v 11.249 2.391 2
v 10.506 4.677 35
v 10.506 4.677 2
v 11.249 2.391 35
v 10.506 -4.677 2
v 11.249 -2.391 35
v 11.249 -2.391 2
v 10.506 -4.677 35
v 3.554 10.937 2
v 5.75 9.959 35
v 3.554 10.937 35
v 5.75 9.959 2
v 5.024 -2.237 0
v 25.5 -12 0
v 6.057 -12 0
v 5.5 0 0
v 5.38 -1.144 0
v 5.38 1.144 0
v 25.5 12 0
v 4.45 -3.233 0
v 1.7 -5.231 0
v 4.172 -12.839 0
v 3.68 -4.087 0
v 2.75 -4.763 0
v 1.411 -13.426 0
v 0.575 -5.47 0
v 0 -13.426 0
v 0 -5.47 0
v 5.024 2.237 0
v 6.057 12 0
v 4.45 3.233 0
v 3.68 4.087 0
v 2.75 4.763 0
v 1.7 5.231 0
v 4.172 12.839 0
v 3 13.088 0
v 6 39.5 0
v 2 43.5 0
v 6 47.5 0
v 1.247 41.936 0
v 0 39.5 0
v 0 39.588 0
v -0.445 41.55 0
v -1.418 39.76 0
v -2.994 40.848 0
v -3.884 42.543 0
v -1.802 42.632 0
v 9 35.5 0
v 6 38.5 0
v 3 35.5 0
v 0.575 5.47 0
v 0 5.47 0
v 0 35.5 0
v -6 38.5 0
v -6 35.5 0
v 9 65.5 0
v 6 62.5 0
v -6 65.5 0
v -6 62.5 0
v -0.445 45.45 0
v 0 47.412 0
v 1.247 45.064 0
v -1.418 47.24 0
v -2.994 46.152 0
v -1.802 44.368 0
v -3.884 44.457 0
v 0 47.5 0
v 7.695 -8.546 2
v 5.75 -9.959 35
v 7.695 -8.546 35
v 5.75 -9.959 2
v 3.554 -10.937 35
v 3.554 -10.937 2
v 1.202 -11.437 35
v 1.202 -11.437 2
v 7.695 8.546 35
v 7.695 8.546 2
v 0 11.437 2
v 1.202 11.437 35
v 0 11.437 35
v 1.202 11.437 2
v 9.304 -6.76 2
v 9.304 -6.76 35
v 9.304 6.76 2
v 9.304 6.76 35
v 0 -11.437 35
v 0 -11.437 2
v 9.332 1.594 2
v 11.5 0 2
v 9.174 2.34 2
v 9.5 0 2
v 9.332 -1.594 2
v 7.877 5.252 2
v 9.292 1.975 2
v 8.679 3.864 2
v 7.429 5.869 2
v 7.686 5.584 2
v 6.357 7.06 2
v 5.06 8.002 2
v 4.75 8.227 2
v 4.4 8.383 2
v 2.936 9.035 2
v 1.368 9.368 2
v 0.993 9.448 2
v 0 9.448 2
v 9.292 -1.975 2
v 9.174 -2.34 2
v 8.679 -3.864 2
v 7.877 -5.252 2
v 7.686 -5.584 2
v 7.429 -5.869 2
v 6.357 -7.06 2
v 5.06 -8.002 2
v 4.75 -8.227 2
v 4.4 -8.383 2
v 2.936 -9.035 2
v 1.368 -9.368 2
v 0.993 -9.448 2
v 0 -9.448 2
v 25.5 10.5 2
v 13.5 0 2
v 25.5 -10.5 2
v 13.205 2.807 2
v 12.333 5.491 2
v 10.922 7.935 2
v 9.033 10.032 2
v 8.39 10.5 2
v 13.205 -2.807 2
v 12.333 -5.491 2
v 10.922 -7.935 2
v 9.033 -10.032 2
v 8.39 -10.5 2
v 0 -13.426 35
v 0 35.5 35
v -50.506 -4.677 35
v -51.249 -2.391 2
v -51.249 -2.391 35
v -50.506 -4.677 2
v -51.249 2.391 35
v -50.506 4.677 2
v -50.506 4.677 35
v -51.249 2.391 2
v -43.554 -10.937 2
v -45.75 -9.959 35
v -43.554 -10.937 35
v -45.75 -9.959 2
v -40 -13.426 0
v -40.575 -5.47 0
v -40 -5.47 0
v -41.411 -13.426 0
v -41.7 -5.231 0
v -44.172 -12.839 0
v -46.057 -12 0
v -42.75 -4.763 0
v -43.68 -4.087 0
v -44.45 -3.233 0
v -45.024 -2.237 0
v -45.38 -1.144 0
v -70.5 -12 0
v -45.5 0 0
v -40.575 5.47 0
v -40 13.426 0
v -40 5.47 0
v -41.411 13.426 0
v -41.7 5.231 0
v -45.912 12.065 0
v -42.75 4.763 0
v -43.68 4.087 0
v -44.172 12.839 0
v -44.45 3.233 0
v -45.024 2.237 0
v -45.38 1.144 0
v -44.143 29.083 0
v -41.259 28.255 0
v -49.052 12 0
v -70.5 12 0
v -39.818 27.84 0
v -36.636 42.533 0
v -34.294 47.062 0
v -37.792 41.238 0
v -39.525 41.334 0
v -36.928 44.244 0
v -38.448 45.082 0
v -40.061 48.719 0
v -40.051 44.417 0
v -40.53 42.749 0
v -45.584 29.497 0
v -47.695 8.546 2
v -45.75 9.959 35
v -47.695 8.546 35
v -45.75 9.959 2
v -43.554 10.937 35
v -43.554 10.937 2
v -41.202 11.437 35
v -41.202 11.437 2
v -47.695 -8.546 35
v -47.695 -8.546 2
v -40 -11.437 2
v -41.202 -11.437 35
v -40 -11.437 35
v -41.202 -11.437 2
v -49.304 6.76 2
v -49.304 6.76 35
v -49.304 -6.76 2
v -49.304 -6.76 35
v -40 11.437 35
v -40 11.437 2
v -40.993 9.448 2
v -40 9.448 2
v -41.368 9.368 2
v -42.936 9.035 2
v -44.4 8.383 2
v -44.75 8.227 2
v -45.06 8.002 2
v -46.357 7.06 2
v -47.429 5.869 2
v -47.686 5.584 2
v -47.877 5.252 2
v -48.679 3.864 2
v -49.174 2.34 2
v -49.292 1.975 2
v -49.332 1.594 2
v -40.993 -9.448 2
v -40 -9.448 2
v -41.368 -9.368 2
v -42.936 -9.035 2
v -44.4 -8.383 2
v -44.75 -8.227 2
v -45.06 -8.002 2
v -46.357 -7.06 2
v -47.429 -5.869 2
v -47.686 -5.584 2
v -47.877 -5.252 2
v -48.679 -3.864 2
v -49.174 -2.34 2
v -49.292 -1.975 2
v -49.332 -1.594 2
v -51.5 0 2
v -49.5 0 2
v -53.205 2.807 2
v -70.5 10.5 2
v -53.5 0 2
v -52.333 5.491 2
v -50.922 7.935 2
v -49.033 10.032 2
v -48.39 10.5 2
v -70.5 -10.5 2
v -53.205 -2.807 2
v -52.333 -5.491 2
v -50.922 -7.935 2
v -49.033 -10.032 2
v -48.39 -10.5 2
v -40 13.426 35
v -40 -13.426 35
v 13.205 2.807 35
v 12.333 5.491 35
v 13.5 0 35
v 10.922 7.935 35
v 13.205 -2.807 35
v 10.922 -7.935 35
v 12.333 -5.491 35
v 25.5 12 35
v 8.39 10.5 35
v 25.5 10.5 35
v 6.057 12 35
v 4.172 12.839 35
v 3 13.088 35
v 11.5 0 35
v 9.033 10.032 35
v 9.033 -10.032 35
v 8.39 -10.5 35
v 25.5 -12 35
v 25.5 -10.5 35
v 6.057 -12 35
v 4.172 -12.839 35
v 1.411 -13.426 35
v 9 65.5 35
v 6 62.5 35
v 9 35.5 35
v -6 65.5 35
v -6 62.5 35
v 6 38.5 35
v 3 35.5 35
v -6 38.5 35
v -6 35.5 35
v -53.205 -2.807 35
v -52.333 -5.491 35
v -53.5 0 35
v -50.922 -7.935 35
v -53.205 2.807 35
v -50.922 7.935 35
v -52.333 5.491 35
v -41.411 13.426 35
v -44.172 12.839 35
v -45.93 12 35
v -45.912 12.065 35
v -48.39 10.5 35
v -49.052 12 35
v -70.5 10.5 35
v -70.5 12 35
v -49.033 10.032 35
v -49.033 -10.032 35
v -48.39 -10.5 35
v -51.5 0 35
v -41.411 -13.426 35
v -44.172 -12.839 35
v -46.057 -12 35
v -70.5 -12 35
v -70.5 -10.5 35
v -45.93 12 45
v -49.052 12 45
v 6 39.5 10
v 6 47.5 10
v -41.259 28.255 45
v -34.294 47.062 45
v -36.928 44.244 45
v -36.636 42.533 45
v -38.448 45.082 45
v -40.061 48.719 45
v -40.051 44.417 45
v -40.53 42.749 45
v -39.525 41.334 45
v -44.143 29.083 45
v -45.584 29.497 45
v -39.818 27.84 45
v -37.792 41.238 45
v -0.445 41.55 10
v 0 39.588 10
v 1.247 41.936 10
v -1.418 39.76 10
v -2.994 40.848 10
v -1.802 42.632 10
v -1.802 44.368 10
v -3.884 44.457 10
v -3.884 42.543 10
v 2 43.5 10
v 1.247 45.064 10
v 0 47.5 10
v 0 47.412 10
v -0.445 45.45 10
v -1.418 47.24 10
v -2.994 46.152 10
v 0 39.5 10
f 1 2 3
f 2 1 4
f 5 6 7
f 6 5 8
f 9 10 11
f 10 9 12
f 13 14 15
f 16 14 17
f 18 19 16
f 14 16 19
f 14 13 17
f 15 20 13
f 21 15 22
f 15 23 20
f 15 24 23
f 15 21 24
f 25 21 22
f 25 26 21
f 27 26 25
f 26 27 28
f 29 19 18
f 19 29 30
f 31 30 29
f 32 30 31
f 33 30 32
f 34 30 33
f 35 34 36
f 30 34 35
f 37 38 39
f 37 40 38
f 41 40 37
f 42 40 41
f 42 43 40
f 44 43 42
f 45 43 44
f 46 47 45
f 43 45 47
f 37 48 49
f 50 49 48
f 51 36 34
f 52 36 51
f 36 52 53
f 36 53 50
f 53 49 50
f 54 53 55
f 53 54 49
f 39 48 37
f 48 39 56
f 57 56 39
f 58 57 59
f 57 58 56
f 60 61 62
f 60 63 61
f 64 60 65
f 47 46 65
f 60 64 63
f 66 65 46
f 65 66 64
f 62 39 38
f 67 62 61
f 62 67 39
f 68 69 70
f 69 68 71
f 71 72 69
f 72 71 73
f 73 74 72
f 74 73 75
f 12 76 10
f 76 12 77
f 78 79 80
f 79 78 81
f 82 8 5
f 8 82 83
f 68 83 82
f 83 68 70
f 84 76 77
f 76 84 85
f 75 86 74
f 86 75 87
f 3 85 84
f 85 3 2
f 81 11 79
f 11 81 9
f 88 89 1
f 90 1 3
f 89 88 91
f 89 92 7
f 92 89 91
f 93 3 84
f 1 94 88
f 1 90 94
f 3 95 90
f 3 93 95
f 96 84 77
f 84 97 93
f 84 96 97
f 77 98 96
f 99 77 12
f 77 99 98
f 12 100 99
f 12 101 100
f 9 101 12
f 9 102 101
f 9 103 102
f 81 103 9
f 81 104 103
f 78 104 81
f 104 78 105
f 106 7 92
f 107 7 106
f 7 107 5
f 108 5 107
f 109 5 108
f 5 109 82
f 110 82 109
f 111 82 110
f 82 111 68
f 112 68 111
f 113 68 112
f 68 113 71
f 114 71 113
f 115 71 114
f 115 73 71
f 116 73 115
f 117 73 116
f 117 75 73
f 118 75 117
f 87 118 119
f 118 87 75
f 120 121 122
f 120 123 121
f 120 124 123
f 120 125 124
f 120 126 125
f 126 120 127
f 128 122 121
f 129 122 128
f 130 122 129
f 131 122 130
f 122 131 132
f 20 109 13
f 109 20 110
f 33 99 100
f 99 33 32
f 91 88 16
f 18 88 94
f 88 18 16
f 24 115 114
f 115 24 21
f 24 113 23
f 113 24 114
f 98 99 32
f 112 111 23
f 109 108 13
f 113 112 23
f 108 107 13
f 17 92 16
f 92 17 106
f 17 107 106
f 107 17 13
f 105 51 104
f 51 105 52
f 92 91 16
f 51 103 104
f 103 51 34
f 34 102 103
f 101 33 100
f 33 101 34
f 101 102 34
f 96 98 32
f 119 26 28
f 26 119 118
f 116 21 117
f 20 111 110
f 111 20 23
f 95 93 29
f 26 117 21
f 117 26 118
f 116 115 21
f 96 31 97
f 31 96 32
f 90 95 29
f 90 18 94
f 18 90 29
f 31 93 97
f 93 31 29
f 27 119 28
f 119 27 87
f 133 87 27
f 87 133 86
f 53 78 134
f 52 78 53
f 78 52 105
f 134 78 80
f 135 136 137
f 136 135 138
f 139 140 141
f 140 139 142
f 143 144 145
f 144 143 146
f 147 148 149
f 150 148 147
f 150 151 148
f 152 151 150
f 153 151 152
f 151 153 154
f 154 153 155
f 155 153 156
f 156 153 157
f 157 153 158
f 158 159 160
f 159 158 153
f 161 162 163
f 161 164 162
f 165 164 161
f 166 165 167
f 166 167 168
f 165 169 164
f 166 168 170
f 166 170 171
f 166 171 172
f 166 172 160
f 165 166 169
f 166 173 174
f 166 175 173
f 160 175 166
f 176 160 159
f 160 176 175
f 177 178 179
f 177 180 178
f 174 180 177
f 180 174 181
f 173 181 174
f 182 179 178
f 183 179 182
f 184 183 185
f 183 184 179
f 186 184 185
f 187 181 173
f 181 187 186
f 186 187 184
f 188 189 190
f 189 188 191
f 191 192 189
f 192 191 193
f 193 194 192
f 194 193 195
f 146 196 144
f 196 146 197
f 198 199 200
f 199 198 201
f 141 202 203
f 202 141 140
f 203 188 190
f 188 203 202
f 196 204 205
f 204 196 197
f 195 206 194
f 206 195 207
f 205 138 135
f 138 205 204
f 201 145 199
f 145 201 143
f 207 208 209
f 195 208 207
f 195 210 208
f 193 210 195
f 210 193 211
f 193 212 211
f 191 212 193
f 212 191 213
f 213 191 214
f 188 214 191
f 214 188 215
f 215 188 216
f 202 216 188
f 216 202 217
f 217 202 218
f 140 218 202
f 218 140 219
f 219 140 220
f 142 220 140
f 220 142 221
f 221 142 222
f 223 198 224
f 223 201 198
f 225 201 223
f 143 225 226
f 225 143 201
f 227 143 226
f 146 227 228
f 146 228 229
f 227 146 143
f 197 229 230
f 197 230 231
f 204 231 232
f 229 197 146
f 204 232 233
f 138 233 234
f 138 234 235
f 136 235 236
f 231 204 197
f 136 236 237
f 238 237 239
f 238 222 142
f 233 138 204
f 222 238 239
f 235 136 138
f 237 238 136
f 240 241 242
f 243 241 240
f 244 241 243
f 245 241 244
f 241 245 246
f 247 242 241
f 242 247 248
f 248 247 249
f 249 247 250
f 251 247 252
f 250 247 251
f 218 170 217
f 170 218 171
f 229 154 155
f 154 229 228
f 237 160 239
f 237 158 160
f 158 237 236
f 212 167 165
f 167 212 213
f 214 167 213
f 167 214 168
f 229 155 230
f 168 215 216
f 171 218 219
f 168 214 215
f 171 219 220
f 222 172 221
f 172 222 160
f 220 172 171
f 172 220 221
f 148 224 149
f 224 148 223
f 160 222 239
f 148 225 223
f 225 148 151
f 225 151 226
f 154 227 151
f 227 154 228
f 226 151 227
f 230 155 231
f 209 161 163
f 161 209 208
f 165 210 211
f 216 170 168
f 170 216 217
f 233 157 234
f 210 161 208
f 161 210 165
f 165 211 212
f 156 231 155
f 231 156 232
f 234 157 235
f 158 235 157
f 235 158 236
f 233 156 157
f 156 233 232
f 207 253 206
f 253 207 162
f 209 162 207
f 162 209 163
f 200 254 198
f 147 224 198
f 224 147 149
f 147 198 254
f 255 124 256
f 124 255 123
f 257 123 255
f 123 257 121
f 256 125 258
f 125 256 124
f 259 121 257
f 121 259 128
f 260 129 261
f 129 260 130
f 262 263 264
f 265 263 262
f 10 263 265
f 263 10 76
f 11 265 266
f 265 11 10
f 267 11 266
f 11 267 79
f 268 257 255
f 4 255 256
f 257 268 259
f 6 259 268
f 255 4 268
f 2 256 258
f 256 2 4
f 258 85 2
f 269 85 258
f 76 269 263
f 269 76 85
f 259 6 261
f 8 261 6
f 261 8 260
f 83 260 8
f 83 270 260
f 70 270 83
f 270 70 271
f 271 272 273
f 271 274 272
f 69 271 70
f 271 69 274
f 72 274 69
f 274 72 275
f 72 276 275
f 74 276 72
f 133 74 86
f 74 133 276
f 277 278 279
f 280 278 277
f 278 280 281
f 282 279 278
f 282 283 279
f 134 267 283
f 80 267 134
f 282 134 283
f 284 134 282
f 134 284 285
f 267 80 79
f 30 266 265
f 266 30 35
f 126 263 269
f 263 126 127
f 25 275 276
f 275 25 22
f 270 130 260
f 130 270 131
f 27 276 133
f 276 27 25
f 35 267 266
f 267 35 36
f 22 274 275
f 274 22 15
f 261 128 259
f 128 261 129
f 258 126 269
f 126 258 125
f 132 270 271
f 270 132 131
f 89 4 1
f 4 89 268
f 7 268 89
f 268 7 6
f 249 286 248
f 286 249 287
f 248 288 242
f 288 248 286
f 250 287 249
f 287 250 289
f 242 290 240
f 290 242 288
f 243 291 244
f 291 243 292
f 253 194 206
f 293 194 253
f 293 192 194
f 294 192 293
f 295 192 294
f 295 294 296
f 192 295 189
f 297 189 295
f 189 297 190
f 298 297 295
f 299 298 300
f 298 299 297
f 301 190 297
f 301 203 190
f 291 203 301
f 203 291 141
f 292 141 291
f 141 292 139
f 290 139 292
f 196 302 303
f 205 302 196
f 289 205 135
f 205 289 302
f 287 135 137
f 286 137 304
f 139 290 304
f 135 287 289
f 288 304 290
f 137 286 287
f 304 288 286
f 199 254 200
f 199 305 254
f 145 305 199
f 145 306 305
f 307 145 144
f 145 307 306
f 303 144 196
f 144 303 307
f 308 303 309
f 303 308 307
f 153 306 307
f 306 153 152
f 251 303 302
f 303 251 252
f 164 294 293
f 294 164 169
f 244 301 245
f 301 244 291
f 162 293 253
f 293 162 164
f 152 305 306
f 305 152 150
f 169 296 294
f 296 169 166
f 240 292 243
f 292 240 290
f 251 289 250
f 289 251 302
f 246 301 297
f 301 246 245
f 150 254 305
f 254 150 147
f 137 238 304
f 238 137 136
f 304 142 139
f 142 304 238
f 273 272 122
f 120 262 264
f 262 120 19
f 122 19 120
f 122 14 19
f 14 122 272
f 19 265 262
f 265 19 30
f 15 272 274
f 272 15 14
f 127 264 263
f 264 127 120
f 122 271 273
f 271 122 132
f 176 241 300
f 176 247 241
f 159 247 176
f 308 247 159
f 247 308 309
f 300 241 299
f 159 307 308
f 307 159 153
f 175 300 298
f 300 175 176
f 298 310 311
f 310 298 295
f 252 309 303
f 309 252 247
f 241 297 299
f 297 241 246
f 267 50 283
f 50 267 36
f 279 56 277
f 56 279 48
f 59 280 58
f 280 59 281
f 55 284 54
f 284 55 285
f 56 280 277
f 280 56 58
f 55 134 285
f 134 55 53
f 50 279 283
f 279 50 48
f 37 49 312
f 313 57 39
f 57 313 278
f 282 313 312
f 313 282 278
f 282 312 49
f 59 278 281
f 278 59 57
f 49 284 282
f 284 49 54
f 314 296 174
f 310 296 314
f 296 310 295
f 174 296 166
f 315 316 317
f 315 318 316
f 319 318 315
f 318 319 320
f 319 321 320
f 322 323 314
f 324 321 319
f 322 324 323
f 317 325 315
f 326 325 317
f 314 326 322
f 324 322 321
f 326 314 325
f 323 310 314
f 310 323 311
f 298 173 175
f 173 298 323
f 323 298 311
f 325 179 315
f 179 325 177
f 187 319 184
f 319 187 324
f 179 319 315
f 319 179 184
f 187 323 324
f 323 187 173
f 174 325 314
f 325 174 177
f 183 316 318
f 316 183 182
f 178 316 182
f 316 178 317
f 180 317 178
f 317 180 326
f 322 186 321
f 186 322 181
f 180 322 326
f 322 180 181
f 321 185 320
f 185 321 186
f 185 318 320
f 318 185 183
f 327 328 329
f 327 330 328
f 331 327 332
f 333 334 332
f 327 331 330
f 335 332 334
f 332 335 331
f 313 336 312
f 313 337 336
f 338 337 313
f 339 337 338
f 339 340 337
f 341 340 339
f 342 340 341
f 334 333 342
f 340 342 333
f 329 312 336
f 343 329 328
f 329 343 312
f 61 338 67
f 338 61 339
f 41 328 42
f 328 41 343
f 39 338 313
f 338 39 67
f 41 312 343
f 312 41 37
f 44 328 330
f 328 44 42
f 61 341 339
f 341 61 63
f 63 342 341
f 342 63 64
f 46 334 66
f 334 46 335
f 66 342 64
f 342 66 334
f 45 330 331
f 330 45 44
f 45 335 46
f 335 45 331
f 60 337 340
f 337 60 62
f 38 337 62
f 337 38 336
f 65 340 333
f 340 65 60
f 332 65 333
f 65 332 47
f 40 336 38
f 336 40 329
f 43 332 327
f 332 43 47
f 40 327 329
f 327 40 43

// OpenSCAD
h = 35; 
innerr = 11.5;
outerr = 13.5;
pennyradius = 10;
pennyheight = 1.52;
length1 = 10;
motorlength = 24;
servothickness = 12;

module hollowcylinder() {
    difference() {
        cylinder(h, outerr, outerr);
        cylinder(h, innerr, innerr);
    }
}

module halfcylinder () {
    intersection() {
        hollowcylinder();
        translate([0,-outerr,0]) {
            cube([outerr,2*outerr,100]);
        }
    }
}

module rotatedhalfcyl() {
    translate([-40, 0, 0]) {
        rotate([0, 0, 180]) {
            halfcylinder();
        }
    }
}

module innerportion() {
    difference() {
        cylinder(2, innerr, innerr);
        cylinder(3, innerr - 6, innerr);
        
    }
}

module innerhalf(){
    intersection() {
        innerportion();
        translate([0, -innerr, 0]) cube([innerr, 2*innerr, 5]);
    }
}

module transinnerhalf() {
    translate([-40, 0, 0]) {
        rotate([0, 0, 180]) innerhalf();
    }
}

module pennystuff(length) {
    difference() {
        translate([outerr - 6, -1.2*pennyradius, 0]) {
                difference() {
                    cube([length*length1, 2.4*pennyradius, h]);
                    translate([0, 0.15*pennyradius, 2]) cube([length*length1, 2.1*pennyradius, h]);
            }
        }
        cylinder(h, outerr, outerr);
    }
}

module servoholder() {
    difference() {
        translate([0, outerr - 1, 0]) {
            cube([3, 22 + motorlength, h]);
        }
        translate([0, 0.5*outerr - 1, 0]) { 
            cylinder([2*outerr, 2*outerr, h]);
        }
    }
}

module extention() {
    servoholder();
    translate([-0.5*servothickness, 22 + outerr, 0]) {
        cube([3 + servothickness, motorlength + 6, h]);
    }
}

module extentionminus() {
    difference() {
        extention();
        translate([-0.5*servothickness, 22 + outerr + 3, 0]) {
            cube([servothickness, motorlength, h]);
        }
    }
}

module entrance() {
    translate([-2, 0, 0]) pennystuff(2);
}

module exit() {
    rotate([0, 0, 180]) {
        translate([38, 0 , 0]) pennystuff(2.5); 
    }  
}

module finger() {
    difference() {
        cube([1.75*pennyradius, 120, 0.8*pennyheight]);
        translate ([0.5*1.75*pennyradius, 115, 0]) cylinder(pennyheight, 1.75*pennyradius, 1.75*pennyradius);
    }
}

module transfinger() {
    translate([-50, 30, 0]) finger();
}

module joint(degrees) {
    translate([-12.5 - 40, 0, 0]) {
        rotate([0, 0, -degrees]) {
            difference() {
                union() {
                    cube([3, 45.26, h + 10]);
                    translate([-1.5, 45.26 - 15, 0]) {
                        cube([6, 20, h + 10]);
                    }
                }
                translate([1.5, 45.26 , 0]) {
                    cylinder(h + 10, 2, 2);
                }
            }
        }
    }
}

module exitandcyl() {
    translate([-40, 0, 0]) {
        translate([-2*outerr, -outerr, 0]) cylinder(h + 10, outerr, outerr);
        translate([-2.5*length1, -1.2*pennyradius, 0]) cube([2.5*length1, 2.4*pennyradius, h + 10]);
    }
}
module jointminus(degrees) {
    difference() {
        joint(degrees);
        exitandcyl();
    }
}

module extracylinder() {
    translate([0, 39.5, 0]) {
        difference() {
            cube([9, 8, 10]);
            difference() {
                translate([0, 4, 0]) {
                    cylinder(10, 4, 4);
                }
            }
        }
        difference() {
            translate([0, 4, 0]) {
                cylinder(10, 4, 4);
            }
            translate([0, 4, 0]) {
                cylinder(10, 2, 2);
            }
        }
    }
}

innerhalf();

transinnerhalf();

rotatedhalfcyl();

halfcylinder();

entrance();

exit();

//transfinger();

extentionminus(); 

jointminus(16.0323394);

extracylinder();
